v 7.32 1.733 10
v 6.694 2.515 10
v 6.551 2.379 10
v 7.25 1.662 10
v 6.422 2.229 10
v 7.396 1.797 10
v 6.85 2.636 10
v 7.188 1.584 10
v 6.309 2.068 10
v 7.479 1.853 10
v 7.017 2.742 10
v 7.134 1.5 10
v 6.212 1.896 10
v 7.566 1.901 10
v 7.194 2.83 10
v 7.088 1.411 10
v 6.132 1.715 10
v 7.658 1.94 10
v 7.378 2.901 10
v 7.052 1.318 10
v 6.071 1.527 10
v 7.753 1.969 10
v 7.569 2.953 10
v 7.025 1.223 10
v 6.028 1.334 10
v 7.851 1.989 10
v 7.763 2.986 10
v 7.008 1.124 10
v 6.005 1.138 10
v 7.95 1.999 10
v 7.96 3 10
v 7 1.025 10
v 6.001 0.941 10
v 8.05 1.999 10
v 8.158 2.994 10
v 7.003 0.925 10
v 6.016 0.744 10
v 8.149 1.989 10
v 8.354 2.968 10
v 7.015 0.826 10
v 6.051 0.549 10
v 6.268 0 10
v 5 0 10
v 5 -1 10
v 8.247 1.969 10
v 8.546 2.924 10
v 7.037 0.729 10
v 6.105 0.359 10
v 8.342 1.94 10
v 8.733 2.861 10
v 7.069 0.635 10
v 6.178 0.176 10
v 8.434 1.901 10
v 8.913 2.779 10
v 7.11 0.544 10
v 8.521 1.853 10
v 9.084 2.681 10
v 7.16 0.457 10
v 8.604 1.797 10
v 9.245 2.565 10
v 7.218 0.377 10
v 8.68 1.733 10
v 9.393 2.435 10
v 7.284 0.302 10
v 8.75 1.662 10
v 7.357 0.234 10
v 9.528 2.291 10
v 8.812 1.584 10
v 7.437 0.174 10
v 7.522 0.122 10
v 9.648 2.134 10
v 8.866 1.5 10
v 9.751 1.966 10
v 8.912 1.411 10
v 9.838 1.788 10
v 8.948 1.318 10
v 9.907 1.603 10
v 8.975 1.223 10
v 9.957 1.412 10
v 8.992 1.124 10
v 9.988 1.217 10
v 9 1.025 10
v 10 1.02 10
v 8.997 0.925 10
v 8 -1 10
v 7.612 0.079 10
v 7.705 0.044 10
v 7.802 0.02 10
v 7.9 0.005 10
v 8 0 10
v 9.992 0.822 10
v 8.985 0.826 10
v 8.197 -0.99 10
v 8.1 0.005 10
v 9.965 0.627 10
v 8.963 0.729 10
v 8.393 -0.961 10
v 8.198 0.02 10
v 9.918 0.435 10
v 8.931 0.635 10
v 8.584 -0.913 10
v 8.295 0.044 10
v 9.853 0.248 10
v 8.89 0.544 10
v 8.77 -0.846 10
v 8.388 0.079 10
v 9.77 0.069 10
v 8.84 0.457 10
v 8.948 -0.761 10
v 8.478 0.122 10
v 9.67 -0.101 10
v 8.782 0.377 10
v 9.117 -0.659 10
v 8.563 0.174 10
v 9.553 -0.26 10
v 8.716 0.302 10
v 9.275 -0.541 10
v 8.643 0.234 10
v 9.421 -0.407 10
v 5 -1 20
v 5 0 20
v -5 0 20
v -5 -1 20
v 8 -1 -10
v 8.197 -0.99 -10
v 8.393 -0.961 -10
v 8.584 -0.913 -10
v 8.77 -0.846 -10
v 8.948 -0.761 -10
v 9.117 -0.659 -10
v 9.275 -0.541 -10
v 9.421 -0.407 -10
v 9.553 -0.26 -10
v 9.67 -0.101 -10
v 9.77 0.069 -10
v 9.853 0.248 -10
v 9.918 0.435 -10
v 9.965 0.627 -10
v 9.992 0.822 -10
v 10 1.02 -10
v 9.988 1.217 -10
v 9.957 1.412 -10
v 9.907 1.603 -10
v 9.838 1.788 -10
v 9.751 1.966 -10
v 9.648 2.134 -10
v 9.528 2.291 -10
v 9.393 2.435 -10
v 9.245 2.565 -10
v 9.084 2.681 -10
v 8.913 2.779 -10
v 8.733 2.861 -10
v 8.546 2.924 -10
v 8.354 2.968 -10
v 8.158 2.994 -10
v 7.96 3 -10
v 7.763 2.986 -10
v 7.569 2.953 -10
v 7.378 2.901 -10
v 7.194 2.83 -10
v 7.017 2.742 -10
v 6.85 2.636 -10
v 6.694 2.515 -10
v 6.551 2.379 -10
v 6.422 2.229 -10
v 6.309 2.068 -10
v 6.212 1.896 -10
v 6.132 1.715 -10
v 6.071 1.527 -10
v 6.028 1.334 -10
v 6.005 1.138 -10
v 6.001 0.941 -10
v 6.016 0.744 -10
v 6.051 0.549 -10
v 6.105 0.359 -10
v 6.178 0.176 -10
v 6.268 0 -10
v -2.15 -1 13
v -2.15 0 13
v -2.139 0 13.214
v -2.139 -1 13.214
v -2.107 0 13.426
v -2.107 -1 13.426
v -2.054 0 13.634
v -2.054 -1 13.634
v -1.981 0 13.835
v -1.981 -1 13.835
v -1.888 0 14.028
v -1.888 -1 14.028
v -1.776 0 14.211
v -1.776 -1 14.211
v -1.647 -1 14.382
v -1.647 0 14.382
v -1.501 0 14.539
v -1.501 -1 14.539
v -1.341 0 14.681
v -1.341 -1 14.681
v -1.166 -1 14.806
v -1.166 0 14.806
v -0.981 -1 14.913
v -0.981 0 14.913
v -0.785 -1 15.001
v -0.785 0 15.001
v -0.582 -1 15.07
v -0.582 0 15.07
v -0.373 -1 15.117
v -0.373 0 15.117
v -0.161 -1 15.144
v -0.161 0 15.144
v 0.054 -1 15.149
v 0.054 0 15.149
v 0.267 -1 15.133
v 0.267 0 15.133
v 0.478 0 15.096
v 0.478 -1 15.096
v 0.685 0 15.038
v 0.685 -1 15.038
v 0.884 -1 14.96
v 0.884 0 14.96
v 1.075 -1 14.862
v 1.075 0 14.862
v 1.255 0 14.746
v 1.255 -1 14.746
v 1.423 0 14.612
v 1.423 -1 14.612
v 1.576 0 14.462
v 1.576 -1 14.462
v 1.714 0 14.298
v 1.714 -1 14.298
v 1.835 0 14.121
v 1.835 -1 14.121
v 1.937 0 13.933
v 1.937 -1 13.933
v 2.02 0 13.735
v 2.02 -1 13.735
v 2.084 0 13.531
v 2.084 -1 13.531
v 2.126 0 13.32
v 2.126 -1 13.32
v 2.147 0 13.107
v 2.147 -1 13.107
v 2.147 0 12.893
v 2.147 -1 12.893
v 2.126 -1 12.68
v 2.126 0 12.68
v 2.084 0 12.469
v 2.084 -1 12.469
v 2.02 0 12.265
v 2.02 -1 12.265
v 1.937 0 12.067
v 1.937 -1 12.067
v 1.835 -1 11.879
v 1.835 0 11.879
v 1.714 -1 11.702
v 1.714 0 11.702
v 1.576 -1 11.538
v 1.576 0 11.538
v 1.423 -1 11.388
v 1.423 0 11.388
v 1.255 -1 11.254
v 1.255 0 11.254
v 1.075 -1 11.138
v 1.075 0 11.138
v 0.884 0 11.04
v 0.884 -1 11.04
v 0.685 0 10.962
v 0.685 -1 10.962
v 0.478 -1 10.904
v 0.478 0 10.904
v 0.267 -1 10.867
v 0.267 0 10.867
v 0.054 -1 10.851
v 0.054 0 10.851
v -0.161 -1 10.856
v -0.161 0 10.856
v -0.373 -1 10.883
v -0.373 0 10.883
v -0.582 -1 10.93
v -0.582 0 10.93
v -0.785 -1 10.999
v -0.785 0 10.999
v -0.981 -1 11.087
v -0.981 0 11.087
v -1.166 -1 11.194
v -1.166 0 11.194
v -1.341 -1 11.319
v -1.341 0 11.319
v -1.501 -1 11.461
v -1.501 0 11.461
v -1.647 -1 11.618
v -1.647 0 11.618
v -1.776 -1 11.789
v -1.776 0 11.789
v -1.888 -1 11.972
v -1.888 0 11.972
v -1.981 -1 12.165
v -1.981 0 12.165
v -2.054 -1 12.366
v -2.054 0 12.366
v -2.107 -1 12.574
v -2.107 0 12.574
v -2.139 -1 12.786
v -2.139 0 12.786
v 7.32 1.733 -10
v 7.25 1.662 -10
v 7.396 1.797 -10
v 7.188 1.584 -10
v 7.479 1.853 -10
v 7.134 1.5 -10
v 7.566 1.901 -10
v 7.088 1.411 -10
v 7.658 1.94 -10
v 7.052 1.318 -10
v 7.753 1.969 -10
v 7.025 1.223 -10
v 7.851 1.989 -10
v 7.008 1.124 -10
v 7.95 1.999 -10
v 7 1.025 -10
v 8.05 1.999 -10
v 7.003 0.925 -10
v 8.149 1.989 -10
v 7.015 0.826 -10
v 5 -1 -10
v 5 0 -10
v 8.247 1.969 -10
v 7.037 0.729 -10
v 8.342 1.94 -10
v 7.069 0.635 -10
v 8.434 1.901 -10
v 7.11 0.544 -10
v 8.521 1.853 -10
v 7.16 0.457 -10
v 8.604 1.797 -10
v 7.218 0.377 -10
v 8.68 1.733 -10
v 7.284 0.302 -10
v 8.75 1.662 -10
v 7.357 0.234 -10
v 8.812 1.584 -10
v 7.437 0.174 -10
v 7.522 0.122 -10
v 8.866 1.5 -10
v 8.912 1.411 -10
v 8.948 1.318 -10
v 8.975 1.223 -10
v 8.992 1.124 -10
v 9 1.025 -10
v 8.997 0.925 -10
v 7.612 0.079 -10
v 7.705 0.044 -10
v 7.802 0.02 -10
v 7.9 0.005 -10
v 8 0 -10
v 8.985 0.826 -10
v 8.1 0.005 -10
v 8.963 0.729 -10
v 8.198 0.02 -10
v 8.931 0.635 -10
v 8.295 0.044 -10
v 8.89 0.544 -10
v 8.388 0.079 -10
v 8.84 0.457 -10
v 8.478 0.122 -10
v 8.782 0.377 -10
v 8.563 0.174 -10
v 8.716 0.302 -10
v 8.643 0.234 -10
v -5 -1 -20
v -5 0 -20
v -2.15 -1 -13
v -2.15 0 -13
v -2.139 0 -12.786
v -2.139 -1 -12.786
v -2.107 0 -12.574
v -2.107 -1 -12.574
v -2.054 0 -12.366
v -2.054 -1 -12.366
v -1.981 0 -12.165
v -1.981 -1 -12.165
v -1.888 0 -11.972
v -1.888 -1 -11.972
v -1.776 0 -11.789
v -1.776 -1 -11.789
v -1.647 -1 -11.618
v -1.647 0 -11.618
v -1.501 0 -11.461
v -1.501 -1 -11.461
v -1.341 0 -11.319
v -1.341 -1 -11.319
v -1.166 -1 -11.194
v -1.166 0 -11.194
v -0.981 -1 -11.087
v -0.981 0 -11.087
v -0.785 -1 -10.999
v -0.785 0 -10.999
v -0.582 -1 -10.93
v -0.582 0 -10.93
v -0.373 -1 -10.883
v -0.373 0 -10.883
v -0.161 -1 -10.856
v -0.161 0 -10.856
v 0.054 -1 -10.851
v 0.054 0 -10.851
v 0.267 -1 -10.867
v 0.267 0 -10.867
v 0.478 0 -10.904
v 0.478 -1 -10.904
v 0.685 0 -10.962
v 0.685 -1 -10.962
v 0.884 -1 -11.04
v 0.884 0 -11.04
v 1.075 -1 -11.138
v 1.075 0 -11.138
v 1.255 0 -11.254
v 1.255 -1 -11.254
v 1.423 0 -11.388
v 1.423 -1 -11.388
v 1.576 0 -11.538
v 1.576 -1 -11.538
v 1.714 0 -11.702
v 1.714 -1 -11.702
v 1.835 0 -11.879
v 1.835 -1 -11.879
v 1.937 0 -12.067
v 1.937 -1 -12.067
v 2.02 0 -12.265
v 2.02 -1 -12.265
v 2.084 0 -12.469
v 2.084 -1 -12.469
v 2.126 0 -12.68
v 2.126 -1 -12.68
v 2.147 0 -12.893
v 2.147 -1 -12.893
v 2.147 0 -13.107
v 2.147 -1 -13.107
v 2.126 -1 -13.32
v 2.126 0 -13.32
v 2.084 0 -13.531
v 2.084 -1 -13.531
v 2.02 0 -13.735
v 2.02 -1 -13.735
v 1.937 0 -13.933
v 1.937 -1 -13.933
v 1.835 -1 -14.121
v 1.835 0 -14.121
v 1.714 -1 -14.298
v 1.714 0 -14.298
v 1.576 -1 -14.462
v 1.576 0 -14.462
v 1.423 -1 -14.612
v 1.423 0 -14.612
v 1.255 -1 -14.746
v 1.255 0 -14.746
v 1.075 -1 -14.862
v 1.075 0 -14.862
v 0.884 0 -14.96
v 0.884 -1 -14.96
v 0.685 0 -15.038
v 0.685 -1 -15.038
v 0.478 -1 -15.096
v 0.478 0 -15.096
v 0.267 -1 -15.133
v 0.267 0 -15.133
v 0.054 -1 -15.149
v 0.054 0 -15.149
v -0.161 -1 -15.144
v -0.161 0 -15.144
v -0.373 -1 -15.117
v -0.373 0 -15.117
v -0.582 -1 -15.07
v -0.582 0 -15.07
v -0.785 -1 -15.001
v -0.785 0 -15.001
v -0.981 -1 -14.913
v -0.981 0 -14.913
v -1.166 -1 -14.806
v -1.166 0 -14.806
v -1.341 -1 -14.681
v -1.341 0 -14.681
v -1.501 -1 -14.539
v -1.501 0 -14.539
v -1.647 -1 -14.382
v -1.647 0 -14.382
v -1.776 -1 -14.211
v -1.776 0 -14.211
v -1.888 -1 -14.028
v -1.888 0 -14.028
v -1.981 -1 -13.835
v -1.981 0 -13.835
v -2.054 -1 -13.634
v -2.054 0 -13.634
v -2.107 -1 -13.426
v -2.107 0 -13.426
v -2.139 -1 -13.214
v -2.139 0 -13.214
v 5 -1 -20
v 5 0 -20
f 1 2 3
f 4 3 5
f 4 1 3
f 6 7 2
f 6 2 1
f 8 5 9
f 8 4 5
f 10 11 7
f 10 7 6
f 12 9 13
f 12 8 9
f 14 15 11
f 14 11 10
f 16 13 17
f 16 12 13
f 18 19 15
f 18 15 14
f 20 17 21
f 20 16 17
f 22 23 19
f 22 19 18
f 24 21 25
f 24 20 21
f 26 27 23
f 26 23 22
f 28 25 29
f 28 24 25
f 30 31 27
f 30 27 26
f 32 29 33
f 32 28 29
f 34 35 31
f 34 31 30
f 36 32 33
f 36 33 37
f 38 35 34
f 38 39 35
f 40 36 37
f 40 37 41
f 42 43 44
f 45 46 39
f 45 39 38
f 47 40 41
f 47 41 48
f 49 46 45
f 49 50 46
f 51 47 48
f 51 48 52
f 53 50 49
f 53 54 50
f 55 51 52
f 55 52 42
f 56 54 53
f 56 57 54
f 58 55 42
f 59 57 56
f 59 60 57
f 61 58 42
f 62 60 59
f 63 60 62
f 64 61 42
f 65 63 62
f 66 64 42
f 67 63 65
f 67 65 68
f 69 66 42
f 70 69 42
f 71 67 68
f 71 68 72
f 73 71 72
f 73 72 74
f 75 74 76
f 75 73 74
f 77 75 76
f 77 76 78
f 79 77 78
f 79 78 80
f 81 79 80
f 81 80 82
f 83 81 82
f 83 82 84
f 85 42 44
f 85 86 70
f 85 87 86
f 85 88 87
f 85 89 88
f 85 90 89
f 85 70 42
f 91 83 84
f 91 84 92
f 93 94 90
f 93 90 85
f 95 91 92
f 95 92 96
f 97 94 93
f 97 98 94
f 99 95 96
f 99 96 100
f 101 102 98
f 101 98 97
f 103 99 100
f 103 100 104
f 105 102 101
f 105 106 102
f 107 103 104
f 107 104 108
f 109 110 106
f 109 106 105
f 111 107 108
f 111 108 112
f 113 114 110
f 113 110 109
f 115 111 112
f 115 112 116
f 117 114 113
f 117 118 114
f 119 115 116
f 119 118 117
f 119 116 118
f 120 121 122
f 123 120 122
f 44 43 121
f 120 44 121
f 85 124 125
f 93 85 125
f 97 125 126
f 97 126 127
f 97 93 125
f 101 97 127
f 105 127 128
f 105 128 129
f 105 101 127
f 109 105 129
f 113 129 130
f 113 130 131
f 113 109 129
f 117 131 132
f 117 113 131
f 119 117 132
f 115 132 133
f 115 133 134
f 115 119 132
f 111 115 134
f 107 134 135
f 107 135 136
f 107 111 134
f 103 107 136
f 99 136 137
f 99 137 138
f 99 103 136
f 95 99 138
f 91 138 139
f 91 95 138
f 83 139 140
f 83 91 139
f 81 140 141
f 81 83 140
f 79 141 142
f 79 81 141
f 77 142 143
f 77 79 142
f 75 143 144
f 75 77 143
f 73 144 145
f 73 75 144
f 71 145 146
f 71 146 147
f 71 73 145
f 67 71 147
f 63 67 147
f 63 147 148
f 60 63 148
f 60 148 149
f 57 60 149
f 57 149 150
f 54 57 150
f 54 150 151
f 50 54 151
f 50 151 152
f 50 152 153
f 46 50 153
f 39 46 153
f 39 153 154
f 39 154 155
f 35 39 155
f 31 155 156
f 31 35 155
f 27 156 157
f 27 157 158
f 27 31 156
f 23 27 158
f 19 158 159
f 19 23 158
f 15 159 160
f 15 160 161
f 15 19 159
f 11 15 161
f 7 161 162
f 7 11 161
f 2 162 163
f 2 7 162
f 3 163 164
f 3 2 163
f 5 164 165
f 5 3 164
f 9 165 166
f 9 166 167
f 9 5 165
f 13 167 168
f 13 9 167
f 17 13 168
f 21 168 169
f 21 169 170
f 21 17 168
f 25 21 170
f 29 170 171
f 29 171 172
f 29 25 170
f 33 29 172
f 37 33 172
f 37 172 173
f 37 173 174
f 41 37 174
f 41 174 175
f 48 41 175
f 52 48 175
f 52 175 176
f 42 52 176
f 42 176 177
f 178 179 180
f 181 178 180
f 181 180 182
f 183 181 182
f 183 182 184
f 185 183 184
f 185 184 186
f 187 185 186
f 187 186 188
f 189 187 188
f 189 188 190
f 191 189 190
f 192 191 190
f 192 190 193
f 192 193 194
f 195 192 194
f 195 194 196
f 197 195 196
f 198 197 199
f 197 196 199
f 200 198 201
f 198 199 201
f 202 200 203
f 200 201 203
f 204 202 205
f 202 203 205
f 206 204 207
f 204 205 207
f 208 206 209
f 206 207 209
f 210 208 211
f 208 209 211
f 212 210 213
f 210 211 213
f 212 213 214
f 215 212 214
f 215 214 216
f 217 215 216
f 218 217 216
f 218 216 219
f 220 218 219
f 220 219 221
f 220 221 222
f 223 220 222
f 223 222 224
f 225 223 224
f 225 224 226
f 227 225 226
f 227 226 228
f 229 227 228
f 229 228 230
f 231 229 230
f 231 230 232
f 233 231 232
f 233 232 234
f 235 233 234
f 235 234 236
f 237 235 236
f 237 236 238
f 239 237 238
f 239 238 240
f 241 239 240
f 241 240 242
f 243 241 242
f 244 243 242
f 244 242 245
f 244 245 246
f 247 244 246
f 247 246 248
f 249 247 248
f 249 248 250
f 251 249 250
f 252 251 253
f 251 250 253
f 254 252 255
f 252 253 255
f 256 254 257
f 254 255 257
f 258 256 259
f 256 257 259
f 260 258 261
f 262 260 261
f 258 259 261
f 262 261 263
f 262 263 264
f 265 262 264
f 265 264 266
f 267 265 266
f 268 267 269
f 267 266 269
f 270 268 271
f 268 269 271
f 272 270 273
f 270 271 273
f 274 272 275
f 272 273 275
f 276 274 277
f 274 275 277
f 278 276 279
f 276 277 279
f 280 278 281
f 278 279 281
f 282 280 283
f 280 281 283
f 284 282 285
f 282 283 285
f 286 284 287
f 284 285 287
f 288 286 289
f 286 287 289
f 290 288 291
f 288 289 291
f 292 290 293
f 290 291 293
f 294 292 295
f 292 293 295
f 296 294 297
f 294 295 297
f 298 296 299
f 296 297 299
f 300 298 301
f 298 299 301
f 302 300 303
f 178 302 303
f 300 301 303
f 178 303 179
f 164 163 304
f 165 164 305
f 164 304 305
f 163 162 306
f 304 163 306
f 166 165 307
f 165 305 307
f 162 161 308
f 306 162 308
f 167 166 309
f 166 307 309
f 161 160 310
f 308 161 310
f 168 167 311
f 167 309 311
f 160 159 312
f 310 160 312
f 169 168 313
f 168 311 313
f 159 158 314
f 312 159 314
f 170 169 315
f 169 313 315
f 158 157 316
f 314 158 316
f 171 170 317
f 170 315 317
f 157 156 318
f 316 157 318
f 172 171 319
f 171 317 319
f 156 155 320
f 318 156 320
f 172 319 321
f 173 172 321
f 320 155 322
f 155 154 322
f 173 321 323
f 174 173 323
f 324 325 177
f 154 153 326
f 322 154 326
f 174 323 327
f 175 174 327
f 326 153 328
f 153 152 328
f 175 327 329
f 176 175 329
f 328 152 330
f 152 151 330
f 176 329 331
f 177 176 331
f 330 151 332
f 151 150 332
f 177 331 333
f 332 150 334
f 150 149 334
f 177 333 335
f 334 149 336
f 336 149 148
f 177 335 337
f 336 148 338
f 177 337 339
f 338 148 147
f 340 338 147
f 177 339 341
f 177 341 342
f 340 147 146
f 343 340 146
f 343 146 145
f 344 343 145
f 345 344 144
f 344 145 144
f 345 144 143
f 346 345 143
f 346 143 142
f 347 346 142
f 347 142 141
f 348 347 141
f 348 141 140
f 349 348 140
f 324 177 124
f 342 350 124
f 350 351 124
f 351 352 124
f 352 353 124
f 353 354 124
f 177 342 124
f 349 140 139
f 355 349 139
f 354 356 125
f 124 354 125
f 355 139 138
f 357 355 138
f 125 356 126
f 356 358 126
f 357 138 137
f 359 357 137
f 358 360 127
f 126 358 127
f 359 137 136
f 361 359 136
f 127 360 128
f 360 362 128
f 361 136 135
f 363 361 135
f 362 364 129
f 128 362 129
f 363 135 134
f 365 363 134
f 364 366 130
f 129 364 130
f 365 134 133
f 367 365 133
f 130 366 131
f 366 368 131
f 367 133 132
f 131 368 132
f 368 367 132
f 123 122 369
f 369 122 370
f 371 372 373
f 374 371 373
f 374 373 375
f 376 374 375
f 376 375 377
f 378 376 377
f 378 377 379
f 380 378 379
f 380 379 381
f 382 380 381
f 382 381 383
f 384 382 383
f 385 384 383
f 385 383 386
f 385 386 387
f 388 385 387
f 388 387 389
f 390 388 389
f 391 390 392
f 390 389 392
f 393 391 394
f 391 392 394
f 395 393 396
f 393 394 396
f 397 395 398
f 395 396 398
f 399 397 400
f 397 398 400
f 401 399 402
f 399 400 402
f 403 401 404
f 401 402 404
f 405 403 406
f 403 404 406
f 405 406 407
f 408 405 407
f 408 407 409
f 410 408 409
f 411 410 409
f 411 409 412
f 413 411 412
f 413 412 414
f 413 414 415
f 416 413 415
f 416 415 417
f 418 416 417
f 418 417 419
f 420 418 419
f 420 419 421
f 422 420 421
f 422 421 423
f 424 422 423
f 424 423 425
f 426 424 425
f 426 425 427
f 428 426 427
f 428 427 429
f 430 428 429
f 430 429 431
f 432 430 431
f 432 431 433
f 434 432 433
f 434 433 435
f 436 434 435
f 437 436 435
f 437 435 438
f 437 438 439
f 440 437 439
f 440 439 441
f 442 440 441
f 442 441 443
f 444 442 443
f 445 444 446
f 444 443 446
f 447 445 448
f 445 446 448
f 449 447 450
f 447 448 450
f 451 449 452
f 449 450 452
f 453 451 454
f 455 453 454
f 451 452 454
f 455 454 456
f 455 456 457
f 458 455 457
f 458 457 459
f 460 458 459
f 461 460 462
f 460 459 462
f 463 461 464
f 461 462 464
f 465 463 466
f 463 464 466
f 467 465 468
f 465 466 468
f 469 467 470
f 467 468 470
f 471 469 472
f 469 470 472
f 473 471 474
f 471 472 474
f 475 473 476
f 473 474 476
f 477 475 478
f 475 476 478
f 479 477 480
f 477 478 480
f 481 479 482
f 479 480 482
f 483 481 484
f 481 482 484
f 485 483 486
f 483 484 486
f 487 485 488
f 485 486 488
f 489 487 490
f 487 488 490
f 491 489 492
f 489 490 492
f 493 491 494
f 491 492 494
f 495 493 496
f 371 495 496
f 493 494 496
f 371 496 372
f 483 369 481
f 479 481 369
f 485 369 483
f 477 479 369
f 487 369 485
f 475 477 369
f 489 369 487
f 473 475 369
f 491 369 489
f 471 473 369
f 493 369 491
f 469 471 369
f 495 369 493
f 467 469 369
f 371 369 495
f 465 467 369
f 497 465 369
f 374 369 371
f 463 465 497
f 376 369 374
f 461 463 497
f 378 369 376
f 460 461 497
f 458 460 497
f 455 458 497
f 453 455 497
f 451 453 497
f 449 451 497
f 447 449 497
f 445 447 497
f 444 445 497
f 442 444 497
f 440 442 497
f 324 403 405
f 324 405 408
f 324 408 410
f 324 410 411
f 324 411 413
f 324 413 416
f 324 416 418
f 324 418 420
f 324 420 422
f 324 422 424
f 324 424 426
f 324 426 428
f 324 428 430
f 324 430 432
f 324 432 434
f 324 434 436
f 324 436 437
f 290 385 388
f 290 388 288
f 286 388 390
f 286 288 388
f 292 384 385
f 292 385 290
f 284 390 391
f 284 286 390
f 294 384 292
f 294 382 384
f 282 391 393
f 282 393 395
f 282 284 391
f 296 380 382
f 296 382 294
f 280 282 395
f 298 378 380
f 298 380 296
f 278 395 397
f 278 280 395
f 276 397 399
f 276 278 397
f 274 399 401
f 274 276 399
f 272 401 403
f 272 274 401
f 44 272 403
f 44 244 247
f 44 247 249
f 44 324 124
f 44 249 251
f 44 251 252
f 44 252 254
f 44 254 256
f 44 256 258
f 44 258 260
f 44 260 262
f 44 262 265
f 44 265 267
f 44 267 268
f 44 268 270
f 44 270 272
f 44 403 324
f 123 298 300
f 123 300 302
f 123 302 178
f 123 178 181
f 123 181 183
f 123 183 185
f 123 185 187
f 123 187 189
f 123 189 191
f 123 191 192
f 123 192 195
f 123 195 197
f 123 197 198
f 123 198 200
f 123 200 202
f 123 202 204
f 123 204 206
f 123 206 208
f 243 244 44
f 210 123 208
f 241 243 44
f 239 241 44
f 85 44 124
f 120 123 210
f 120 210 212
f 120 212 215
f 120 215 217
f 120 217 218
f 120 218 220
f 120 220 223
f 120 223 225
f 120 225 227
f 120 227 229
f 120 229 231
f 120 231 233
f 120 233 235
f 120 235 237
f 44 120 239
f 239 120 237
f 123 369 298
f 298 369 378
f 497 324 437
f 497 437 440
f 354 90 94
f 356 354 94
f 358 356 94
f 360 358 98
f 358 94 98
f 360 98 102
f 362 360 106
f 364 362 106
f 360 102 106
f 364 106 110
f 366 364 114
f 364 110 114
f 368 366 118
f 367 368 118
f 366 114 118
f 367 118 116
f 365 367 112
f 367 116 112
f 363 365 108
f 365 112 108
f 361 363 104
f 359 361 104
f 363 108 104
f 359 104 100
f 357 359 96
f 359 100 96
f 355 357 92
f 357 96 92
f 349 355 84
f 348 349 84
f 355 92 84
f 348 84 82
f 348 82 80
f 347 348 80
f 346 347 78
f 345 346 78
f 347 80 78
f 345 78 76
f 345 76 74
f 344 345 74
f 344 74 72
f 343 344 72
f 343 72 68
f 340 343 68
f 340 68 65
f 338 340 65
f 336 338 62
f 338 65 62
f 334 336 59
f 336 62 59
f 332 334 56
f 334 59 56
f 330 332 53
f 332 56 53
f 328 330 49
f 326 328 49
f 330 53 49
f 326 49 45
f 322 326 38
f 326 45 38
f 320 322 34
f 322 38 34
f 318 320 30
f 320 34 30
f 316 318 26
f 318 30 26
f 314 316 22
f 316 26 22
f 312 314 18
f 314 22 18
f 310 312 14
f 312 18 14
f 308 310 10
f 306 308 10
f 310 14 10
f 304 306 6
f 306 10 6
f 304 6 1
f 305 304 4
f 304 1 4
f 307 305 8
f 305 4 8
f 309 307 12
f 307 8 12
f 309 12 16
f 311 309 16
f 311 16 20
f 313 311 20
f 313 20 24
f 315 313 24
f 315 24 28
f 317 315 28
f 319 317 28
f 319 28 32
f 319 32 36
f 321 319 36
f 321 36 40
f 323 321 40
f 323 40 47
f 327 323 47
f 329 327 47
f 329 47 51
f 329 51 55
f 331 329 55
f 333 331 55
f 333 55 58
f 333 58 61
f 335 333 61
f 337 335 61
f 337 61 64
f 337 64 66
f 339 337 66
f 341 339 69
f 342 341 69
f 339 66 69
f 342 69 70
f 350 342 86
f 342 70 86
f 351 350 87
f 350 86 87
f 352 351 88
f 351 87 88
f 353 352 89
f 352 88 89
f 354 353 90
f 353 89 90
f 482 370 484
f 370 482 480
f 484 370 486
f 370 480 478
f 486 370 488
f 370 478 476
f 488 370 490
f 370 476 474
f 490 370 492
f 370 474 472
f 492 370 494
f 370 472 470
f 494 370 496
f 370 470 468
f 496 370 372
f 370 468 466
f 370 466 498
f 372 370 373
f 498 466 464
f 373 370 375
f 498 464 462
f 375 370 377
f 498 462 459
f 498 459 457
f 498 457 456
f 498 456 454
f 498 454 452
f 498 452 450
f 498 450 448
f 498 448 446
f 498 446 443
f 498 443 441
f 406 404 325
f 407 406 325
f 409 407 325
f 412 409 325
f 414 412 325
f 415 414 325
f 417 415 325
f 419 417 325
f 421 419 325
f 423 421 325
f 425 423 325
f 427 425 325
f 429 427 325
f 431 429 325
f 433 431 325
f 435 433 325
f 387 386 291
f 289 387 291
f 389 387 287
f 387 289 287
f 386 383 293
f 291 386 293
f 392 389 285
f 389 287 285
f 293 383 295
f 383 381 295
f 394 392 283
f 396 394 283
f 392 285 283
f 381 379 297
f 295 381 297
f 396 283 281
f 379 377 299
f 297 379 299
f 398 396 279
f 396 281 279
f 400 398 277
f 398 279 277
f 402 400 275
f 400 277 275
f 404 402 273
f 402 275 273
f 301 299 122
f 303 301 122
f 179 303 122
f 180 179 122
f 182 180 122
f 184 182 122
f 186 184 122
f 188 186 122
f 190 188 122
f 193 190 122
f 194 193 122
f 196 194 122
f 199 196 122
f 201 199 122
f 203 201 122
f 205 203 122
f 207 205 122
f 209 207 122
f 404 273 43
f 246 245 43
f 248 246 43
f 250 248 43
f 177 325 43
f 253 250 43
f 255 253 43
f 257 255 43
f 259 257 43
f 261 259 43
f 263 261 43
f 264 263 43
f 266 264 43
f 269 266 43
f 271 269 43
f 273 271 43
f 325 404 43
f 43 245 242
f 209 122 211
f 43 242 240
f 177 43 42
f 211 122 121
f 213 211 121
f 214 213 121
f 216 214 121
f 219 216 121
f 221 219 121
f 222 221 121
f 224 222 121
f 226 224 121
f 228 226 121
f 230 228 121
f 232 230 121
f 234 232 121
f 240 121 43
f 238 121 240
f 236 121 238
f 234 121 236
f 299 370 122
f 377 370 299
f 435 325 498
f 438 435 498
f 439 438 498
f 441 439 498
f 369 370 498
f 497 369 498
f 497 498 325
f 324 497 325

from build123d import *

# Parameters (mm, degrees)
F0_W     = 3
F0_H     = 20
F1_DEPTH = 1
F2_W     = 1
F2_H     = 20
F5_D     = 4.3
F5_DEPTH = 2.5
F5_TIP   = 1.2918503309


# Not quite as in the source:
# - a feature names something its author has since deleted; it is built from what else it names


with BuildPart() as f1:
    # F0 (on Front) → F1 (new body)
    with BuildSketch(Plane.XZ):
        Polygon((5, 10), (5, 20), (-5, 20), (-5, -20), (5, -20), (5, -10), align=None)
        with Locations((6.5, 0)):
            Rectangle(F0_W, F0_H)
    extrude(amount=F1_DEPTH)

    # F2 (on face) → F3 (revolve)
    with BuildSketch(Plane.YZ.offset(8)):
        with Locations((-0.5, 0)):
            Rectangle(F2_W, F2_H)
    revolve(axis=Axis((8, 1, 0), (0, 0, 1)))

    # F5
    with Locations(Plane.XZ.offset(1)):
        with Locations((0, 13), (0, -13)):
            Hole(F5_D / 2, depth=F5_DEPTH)
            with Locations((0, 0, -(F5_DEPTH + F5_TIP / 2))):  # 118° drill point
                Cone(0, F5_D / 2, F5_TIP, mode=Mode.SUBTRACT)


solid = f1.part
